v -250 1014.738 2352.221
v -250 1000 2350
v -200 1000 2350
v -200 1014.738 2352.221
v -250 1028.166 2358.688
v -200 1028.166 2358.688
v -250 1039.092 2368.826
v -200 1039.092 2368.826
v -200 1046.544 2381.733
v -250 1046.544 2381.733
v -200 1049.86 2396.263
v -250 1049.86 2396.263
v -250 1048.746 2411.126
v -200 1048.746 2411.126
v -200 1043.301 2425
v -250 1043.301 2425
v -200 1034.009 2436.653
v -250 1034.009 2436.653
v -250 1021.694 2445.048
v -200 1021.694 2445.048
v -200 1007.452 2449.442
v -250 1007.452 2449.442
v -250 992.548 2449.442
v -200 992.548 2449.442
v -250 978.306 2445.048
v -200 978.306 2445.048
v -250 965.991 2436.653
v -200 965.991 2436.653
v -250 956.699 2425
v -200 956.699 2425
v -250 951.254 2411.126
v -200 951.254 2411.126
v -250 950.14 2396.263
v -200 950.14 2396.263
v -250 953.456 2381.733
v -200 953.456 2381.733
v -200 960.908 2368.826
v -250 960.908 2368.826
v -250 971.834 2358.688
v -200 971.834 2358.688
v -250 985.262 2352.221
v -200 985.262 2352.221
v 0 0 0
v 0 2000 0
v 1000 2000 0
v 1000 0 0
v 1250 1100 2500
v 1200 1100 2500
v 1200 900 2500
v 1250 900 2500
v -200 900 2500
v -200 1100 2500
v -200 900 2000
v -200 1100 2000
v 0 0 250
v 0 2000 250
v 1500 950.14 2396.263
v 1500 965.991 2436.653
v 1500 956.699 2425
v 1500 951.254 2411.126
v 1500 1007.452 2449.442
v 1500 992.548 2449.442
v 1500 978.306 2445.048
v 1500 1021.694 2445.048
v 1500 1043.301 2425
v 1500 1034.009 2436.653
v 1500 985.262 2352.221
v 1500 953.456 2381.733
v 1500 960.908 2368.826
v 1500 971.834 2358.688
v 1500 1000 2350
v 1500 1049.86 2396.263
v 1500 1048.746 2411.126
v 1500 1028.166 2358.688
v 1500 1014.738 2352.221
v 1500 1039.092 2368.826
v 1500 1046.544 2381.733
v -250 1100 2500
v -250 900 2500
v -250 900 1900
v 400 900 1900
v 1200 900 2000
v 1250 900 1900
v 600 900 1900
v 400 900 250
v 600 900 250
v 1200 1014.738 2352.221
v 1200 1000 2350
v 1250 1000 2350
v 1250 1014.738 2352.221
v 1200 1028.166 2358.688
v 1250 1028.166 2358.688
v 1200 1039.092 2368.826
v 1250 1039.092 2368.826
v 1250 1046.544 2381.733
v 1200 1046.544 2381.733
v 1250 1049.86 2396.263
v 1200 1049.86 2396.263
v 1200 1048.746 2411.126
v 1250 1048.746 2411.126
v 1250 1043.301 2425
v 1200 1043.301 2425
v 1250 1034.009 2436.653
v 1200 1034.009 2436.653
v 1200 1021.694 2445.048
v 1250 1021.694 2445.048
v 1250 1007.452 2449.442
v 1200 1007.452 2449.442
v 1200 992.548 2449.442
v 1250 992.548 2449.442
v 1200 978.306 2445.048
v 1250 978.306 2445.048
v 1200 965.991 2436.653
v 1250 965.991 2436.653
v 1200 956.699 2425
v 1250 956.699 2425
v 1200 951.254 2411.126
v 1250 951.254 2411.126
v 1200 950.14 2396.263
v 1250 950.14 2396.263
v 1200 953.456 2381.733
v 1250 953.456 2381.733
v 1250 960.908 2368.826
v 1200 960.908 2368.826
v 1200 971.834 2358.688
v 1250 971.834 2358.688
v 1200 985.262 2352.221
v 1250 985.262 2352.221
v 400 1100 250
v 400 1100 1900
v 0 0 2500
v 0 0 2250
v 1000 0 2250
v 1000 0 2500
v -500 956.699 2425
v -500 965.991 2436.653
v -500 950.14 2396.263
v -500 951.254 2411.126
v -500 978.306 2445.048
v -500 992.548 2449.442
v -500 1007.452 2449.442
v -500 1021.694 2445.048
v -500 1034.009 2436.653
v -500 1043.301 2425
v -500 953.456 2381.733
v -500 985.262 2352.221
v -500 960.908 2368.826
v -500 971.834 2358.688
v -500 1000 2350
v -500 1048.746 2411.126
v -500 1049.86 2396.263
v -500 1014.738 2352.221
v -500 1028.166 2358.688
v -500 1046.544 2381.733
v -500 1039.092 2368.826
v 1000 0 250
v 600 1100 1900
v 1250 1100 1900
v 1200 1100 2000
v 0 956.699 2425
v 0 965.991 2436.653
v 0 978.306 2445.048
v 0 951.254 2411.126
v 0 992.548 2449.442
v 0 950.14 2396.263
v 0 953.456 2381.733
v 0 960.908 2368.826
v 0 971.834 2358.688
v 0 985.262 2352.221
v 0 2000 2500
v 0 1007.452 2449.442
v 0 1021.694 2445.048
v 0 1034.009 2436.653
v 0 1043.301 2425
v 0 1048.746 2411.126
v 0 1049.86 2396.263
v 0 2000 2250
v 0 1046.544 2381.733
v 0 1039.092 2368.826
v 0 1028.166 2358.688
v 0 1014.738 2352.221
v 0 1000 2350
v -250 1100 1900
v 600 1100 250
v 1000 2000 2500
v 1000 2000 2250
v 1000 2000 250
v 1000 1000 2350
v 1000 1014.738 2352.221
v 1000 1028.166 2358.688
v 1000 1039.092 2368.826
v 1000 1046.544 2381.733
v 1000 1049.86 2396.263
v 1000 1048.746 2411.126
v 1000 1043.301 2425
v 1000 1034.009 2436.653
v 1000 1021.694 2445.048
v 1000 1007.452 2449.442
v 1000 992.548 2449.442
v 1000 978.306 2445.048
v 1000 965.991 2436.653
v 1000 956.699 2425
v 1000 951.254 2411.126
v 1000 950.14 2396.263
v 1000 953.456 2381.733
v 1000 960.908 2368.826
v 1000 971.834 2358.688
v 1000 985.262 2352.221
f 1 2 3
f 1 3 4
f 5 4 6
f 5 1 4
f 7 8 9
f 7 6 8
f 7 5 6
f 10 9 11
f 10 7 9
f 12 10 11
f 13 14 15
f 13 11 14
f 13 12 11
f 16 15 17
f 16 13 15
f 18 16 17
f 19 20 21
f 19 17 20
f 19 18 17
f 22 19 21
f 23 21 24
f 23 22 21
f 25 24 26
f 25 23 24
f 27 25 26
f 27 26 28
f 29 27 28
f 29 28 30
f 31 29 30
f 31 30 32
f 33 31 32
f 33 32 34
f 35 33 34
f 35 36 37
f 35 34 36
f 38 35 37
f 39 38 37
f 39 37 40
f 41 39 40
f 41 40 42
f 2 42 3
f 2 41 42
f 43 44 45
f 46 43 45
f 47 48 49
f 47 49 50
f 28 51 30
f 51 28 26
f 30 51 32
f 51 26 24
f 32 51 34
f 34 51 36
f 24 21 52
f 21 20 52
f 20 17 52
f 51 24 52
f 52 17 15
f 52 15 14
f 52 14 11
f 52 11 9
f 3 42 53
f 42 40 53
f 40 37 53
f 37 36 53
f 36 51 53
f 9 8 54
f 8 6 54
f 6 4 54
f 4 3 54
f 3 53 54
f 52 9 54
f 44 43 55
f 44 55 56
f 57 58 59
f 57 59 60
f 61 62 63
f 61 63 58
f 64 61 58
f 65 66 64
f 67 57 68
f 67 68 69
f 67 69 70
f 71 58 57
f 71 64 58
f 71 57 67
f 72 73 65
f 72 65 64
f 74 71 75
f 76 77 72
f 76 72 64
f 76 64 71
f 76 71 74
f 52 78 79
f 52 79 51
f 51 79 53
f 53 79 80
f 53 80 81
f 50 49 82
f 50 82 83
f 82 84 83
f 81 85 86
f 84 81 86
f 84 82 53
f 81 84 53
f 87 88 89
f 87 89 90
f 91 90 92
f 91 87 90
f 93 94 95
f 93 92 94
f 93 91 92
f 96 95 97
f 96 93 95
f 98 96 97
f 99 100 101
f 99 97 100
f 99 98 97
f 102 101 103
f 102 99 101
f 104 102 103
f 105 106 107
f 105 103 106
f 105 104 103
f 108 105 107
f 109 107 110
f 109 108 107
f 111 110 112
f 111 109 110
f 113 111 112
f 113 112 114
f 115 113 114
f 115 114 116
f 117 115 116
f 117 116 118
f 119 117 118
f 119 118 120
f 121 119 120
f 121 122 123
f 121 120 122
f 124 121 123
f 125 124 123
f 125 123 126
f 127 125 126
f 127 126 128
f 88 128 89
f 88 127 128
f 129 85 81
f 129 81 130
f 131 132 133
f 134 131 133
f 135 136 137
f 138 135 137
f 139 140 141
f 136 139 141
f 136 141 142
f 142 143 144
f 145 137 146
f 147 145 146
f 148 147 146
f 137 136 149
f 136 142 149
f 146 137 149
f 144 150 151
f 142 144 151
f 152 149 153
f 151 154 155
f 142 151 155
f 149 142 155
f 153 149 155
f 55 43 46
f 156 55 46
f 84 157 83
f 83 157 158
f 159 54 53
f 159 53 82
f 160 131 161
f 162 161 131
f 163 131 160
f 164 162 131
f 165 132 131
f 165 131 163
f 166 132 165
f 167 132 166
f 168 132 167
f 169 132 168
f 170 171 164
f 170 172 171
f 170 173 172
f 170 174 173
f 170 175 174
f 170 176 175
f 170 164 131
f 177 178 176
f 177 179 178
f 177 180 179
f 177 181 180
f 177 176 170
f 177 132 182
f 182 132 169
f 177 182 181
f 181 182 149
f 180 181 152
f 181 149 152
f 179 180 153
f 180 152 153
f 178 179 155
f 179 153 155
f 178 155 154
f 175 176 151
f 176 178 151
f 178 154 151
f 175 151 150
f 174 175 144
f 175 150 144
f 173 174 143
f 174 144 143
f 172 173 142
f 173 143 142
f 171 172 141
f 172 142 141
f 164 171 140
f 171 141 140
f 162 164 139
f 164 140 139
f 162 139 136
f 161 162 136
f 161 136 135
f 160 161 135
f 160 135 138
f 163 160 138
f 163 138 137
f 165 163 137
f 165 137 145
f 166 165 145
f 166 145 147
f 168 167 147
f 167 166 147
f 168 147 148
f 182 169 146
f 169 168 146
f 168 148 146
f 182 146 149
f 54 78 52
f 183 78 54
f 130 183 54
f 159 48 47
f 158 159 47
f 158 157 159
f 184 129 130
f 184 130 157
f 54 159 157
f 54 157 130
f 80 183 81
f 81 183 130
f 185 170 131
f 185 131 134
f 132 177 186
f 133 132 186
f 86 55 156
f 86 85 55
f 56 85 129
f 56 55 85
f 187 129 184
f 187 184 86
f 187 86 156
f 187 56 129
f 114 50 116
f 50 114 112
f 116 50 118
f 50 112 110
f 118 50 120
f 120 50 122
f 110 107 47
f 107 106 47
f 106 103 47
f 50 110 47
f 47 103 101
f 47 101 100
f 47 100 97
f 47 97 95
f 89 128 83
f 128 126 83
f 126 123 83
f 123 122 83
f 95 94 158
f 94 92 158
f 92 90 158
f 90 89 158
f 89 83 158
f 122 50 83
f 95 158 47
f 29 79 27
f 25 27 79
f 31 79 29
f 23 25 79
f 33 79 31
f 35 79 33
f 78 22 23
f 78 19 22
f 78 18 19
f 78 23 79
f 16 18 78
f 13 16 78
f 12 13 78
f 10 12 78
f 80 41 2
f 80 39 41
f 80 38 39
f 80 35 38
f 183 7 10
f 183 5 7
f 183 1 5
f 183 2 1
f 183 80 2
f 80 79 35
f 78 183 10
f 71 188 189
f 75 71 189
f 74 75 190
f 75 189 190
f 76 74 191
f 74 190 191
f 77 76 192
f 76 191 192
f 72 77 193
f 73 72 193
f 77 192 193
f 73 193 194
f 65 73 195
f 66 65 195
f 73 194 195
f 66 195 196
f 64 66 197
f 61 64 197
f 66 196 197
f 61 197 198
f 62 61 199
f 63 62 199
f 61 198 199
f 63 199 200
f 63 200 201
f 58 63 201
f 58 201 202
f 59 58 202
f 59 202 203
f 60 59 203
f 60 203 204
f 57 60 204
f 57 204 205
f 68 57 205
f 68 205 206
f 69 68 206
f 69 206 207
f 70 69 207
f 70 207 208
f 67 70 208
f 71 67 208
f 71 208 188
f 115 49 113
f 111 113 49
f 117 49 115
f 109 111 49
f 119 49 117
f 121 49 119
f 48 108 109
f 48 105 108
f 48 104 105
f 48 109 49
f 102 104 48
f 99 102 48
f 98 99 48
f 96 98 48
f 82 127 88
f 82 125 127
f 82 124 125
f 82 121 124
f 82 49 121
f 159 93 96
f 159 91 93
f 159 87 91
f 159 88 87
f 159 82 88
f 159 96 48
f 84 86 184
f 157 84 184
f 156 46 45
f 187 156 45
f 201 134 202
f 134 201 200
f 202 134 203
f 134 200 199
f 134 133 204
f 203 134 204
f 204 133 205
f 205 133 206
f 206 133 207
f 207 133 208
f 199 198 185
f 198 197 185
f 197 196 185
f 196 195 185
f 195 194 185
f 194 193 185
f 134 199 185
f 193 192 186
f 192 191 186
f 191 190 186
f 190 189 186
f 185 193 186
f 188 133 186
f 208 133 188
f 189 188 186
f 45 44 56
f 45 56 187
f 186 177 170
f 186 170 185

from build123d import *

# Parameters (mm, degrees)
CYLINDER_R        = 50
CYLINDER_DEPTH    = 2000
BOX003_W          = 50
BOX003_H          = 200
BOX003_DEPTH      = 500
BOX002_W          = 1500
BOX002_H          = 200
BOX002_DEPTH      = 100
BOX001_W          = 200
BOX001_H          = 200
BOX001_DEPTH      = 2000
BOX_W             = 1000
BOX_H             = 2000
BOX_DEPTH         = 250
BOX004_W          = 50
BOX004_H          = 200
BOX004_DEPTH      = 500
CYLINDER002_R     = 50
CYLINDER002_DEPTH = 2000
CYLINDER001_R     = 50
CYLINDER001_DEPTH = 2000
BOX005_W          = 1000
BOX005_H          = 2000
BOX005_DEPTH      = 250


with BuildPart() as cilindro:
    # Cylinder → Cylinder (new body)
    with BuildSketch(Plane(origin=(-500, 1000, 2400), x_dir=(0, 0, -1), z_dir=(1, 0, 0))):
        Circle(CYLINDER_R)
    extrude(amount=CYLINDER_DEPTH)


with BuildPart() as cubo003:
    # Box003 → Box003 (new body)
    with BuildSketch(Plane(origin=(-250, 900, 2000), x_dir=(1, 0, 0), z_dir=(0, 0, 1))):
        with Locations((25, 100)):
            Rectangle(BOX003_W, BOX003_H)
    extrude(amount=BOX003_DEPTH)


with BuildPart() as cubo002:
    # Box002 → Box002 (new body)
    with BuildSketch(Plane(origin=(-250, 900, 1900), x_dir=(1, 0, 0), z_dir=(0, 0, 1))):
        with Locations((750, 100)):
            Rectangle(BOX002_W, BOX002_H)
    extrude(amount=BOX002_DEPTH)


with BuildPart() as cubo001:
    # Box001 → Box001 (new body)
    with BuildSketch(Plane(origin=(400, 900, 0), x_dir=(1, 0, 0), z_dir=(0, 0, 1))):
        with Locations((100, 100)):
            Rectangle(BOX001_W, BOX001_H)
    extrude(amount=BOX001_DEPTH)


with BuildPart() as fusion001:
    # Box → Box (new body)
    with BuildSketch(Plane.XY):
        with Locations((500, 1000)):
            Rectangle(BOX_W, BOX_H)
    extrude(amount=BOX_DEPTH)

    # Fusion: union Cubo001
    add(cubo001.part)

    # Fusion001: union Cubo002
    add(cubo002.part)


with BuildPart() as cut:
    # Box004 → Box004 (new body)
    with BuildSketch(Plane(origin=(1200, 900, 2000), x_dir=(1, 0, 0), z_dir=(0, 0, 1))):
        with Locations((25, 100)):
            Rectangle(BOX004_W, BOX004_H)
    extrude(amount=BOX004_DEPTH)

    # Fusion002: union Cubo003, Fusion001
    add(cubo003.part)
    add(fusion001.part)

    # Cut: cut Cilindro
    add(cilindro.part, mode=Mode.SUBTRACT)


with BuildPart() as cilindro002:
    # Cylinder002 → Cylinder002 (new body)
    with BuildSketch(Plane(origin=(-500, 1000, 2400), x_dir=(0, 0, -1), z_dir=(1, 0, 0))):
        Circle(CYLINDER002_R)
    extrude(amount=CYLINDER002_DEPTH)


with BuildPart() as cilindro001:
    # Cylinder001 → Cylinder001 (new body)
    with BuildSketch(Plane(origin=(-500, 1000, 2400), x_dir=(0, 0, -1), z_dir=(1, 0, 0))):
        Circle(CYLINDER001_R)
    extrude(amount=CYLINDER001_DEPTH)


with BuildPart() as fusion003:
    # Box005 → Box005 (new body)
    with BuildSketch(Plane.XY.offset(2250)):
        with Locations((500, 1000)):
            Rectangle(BOX005_W, BOX005_H)
    extrude(amount=BOX005_DEPTH)

    # Cut001: cut Cilindro001
    add(cilindro001.part, mode=Mode.SUBTRACT)

    # Fusion003: union Cilindro002
    add(cilindro002.part)


solid = Compound([cut.part, fusion003.part])
